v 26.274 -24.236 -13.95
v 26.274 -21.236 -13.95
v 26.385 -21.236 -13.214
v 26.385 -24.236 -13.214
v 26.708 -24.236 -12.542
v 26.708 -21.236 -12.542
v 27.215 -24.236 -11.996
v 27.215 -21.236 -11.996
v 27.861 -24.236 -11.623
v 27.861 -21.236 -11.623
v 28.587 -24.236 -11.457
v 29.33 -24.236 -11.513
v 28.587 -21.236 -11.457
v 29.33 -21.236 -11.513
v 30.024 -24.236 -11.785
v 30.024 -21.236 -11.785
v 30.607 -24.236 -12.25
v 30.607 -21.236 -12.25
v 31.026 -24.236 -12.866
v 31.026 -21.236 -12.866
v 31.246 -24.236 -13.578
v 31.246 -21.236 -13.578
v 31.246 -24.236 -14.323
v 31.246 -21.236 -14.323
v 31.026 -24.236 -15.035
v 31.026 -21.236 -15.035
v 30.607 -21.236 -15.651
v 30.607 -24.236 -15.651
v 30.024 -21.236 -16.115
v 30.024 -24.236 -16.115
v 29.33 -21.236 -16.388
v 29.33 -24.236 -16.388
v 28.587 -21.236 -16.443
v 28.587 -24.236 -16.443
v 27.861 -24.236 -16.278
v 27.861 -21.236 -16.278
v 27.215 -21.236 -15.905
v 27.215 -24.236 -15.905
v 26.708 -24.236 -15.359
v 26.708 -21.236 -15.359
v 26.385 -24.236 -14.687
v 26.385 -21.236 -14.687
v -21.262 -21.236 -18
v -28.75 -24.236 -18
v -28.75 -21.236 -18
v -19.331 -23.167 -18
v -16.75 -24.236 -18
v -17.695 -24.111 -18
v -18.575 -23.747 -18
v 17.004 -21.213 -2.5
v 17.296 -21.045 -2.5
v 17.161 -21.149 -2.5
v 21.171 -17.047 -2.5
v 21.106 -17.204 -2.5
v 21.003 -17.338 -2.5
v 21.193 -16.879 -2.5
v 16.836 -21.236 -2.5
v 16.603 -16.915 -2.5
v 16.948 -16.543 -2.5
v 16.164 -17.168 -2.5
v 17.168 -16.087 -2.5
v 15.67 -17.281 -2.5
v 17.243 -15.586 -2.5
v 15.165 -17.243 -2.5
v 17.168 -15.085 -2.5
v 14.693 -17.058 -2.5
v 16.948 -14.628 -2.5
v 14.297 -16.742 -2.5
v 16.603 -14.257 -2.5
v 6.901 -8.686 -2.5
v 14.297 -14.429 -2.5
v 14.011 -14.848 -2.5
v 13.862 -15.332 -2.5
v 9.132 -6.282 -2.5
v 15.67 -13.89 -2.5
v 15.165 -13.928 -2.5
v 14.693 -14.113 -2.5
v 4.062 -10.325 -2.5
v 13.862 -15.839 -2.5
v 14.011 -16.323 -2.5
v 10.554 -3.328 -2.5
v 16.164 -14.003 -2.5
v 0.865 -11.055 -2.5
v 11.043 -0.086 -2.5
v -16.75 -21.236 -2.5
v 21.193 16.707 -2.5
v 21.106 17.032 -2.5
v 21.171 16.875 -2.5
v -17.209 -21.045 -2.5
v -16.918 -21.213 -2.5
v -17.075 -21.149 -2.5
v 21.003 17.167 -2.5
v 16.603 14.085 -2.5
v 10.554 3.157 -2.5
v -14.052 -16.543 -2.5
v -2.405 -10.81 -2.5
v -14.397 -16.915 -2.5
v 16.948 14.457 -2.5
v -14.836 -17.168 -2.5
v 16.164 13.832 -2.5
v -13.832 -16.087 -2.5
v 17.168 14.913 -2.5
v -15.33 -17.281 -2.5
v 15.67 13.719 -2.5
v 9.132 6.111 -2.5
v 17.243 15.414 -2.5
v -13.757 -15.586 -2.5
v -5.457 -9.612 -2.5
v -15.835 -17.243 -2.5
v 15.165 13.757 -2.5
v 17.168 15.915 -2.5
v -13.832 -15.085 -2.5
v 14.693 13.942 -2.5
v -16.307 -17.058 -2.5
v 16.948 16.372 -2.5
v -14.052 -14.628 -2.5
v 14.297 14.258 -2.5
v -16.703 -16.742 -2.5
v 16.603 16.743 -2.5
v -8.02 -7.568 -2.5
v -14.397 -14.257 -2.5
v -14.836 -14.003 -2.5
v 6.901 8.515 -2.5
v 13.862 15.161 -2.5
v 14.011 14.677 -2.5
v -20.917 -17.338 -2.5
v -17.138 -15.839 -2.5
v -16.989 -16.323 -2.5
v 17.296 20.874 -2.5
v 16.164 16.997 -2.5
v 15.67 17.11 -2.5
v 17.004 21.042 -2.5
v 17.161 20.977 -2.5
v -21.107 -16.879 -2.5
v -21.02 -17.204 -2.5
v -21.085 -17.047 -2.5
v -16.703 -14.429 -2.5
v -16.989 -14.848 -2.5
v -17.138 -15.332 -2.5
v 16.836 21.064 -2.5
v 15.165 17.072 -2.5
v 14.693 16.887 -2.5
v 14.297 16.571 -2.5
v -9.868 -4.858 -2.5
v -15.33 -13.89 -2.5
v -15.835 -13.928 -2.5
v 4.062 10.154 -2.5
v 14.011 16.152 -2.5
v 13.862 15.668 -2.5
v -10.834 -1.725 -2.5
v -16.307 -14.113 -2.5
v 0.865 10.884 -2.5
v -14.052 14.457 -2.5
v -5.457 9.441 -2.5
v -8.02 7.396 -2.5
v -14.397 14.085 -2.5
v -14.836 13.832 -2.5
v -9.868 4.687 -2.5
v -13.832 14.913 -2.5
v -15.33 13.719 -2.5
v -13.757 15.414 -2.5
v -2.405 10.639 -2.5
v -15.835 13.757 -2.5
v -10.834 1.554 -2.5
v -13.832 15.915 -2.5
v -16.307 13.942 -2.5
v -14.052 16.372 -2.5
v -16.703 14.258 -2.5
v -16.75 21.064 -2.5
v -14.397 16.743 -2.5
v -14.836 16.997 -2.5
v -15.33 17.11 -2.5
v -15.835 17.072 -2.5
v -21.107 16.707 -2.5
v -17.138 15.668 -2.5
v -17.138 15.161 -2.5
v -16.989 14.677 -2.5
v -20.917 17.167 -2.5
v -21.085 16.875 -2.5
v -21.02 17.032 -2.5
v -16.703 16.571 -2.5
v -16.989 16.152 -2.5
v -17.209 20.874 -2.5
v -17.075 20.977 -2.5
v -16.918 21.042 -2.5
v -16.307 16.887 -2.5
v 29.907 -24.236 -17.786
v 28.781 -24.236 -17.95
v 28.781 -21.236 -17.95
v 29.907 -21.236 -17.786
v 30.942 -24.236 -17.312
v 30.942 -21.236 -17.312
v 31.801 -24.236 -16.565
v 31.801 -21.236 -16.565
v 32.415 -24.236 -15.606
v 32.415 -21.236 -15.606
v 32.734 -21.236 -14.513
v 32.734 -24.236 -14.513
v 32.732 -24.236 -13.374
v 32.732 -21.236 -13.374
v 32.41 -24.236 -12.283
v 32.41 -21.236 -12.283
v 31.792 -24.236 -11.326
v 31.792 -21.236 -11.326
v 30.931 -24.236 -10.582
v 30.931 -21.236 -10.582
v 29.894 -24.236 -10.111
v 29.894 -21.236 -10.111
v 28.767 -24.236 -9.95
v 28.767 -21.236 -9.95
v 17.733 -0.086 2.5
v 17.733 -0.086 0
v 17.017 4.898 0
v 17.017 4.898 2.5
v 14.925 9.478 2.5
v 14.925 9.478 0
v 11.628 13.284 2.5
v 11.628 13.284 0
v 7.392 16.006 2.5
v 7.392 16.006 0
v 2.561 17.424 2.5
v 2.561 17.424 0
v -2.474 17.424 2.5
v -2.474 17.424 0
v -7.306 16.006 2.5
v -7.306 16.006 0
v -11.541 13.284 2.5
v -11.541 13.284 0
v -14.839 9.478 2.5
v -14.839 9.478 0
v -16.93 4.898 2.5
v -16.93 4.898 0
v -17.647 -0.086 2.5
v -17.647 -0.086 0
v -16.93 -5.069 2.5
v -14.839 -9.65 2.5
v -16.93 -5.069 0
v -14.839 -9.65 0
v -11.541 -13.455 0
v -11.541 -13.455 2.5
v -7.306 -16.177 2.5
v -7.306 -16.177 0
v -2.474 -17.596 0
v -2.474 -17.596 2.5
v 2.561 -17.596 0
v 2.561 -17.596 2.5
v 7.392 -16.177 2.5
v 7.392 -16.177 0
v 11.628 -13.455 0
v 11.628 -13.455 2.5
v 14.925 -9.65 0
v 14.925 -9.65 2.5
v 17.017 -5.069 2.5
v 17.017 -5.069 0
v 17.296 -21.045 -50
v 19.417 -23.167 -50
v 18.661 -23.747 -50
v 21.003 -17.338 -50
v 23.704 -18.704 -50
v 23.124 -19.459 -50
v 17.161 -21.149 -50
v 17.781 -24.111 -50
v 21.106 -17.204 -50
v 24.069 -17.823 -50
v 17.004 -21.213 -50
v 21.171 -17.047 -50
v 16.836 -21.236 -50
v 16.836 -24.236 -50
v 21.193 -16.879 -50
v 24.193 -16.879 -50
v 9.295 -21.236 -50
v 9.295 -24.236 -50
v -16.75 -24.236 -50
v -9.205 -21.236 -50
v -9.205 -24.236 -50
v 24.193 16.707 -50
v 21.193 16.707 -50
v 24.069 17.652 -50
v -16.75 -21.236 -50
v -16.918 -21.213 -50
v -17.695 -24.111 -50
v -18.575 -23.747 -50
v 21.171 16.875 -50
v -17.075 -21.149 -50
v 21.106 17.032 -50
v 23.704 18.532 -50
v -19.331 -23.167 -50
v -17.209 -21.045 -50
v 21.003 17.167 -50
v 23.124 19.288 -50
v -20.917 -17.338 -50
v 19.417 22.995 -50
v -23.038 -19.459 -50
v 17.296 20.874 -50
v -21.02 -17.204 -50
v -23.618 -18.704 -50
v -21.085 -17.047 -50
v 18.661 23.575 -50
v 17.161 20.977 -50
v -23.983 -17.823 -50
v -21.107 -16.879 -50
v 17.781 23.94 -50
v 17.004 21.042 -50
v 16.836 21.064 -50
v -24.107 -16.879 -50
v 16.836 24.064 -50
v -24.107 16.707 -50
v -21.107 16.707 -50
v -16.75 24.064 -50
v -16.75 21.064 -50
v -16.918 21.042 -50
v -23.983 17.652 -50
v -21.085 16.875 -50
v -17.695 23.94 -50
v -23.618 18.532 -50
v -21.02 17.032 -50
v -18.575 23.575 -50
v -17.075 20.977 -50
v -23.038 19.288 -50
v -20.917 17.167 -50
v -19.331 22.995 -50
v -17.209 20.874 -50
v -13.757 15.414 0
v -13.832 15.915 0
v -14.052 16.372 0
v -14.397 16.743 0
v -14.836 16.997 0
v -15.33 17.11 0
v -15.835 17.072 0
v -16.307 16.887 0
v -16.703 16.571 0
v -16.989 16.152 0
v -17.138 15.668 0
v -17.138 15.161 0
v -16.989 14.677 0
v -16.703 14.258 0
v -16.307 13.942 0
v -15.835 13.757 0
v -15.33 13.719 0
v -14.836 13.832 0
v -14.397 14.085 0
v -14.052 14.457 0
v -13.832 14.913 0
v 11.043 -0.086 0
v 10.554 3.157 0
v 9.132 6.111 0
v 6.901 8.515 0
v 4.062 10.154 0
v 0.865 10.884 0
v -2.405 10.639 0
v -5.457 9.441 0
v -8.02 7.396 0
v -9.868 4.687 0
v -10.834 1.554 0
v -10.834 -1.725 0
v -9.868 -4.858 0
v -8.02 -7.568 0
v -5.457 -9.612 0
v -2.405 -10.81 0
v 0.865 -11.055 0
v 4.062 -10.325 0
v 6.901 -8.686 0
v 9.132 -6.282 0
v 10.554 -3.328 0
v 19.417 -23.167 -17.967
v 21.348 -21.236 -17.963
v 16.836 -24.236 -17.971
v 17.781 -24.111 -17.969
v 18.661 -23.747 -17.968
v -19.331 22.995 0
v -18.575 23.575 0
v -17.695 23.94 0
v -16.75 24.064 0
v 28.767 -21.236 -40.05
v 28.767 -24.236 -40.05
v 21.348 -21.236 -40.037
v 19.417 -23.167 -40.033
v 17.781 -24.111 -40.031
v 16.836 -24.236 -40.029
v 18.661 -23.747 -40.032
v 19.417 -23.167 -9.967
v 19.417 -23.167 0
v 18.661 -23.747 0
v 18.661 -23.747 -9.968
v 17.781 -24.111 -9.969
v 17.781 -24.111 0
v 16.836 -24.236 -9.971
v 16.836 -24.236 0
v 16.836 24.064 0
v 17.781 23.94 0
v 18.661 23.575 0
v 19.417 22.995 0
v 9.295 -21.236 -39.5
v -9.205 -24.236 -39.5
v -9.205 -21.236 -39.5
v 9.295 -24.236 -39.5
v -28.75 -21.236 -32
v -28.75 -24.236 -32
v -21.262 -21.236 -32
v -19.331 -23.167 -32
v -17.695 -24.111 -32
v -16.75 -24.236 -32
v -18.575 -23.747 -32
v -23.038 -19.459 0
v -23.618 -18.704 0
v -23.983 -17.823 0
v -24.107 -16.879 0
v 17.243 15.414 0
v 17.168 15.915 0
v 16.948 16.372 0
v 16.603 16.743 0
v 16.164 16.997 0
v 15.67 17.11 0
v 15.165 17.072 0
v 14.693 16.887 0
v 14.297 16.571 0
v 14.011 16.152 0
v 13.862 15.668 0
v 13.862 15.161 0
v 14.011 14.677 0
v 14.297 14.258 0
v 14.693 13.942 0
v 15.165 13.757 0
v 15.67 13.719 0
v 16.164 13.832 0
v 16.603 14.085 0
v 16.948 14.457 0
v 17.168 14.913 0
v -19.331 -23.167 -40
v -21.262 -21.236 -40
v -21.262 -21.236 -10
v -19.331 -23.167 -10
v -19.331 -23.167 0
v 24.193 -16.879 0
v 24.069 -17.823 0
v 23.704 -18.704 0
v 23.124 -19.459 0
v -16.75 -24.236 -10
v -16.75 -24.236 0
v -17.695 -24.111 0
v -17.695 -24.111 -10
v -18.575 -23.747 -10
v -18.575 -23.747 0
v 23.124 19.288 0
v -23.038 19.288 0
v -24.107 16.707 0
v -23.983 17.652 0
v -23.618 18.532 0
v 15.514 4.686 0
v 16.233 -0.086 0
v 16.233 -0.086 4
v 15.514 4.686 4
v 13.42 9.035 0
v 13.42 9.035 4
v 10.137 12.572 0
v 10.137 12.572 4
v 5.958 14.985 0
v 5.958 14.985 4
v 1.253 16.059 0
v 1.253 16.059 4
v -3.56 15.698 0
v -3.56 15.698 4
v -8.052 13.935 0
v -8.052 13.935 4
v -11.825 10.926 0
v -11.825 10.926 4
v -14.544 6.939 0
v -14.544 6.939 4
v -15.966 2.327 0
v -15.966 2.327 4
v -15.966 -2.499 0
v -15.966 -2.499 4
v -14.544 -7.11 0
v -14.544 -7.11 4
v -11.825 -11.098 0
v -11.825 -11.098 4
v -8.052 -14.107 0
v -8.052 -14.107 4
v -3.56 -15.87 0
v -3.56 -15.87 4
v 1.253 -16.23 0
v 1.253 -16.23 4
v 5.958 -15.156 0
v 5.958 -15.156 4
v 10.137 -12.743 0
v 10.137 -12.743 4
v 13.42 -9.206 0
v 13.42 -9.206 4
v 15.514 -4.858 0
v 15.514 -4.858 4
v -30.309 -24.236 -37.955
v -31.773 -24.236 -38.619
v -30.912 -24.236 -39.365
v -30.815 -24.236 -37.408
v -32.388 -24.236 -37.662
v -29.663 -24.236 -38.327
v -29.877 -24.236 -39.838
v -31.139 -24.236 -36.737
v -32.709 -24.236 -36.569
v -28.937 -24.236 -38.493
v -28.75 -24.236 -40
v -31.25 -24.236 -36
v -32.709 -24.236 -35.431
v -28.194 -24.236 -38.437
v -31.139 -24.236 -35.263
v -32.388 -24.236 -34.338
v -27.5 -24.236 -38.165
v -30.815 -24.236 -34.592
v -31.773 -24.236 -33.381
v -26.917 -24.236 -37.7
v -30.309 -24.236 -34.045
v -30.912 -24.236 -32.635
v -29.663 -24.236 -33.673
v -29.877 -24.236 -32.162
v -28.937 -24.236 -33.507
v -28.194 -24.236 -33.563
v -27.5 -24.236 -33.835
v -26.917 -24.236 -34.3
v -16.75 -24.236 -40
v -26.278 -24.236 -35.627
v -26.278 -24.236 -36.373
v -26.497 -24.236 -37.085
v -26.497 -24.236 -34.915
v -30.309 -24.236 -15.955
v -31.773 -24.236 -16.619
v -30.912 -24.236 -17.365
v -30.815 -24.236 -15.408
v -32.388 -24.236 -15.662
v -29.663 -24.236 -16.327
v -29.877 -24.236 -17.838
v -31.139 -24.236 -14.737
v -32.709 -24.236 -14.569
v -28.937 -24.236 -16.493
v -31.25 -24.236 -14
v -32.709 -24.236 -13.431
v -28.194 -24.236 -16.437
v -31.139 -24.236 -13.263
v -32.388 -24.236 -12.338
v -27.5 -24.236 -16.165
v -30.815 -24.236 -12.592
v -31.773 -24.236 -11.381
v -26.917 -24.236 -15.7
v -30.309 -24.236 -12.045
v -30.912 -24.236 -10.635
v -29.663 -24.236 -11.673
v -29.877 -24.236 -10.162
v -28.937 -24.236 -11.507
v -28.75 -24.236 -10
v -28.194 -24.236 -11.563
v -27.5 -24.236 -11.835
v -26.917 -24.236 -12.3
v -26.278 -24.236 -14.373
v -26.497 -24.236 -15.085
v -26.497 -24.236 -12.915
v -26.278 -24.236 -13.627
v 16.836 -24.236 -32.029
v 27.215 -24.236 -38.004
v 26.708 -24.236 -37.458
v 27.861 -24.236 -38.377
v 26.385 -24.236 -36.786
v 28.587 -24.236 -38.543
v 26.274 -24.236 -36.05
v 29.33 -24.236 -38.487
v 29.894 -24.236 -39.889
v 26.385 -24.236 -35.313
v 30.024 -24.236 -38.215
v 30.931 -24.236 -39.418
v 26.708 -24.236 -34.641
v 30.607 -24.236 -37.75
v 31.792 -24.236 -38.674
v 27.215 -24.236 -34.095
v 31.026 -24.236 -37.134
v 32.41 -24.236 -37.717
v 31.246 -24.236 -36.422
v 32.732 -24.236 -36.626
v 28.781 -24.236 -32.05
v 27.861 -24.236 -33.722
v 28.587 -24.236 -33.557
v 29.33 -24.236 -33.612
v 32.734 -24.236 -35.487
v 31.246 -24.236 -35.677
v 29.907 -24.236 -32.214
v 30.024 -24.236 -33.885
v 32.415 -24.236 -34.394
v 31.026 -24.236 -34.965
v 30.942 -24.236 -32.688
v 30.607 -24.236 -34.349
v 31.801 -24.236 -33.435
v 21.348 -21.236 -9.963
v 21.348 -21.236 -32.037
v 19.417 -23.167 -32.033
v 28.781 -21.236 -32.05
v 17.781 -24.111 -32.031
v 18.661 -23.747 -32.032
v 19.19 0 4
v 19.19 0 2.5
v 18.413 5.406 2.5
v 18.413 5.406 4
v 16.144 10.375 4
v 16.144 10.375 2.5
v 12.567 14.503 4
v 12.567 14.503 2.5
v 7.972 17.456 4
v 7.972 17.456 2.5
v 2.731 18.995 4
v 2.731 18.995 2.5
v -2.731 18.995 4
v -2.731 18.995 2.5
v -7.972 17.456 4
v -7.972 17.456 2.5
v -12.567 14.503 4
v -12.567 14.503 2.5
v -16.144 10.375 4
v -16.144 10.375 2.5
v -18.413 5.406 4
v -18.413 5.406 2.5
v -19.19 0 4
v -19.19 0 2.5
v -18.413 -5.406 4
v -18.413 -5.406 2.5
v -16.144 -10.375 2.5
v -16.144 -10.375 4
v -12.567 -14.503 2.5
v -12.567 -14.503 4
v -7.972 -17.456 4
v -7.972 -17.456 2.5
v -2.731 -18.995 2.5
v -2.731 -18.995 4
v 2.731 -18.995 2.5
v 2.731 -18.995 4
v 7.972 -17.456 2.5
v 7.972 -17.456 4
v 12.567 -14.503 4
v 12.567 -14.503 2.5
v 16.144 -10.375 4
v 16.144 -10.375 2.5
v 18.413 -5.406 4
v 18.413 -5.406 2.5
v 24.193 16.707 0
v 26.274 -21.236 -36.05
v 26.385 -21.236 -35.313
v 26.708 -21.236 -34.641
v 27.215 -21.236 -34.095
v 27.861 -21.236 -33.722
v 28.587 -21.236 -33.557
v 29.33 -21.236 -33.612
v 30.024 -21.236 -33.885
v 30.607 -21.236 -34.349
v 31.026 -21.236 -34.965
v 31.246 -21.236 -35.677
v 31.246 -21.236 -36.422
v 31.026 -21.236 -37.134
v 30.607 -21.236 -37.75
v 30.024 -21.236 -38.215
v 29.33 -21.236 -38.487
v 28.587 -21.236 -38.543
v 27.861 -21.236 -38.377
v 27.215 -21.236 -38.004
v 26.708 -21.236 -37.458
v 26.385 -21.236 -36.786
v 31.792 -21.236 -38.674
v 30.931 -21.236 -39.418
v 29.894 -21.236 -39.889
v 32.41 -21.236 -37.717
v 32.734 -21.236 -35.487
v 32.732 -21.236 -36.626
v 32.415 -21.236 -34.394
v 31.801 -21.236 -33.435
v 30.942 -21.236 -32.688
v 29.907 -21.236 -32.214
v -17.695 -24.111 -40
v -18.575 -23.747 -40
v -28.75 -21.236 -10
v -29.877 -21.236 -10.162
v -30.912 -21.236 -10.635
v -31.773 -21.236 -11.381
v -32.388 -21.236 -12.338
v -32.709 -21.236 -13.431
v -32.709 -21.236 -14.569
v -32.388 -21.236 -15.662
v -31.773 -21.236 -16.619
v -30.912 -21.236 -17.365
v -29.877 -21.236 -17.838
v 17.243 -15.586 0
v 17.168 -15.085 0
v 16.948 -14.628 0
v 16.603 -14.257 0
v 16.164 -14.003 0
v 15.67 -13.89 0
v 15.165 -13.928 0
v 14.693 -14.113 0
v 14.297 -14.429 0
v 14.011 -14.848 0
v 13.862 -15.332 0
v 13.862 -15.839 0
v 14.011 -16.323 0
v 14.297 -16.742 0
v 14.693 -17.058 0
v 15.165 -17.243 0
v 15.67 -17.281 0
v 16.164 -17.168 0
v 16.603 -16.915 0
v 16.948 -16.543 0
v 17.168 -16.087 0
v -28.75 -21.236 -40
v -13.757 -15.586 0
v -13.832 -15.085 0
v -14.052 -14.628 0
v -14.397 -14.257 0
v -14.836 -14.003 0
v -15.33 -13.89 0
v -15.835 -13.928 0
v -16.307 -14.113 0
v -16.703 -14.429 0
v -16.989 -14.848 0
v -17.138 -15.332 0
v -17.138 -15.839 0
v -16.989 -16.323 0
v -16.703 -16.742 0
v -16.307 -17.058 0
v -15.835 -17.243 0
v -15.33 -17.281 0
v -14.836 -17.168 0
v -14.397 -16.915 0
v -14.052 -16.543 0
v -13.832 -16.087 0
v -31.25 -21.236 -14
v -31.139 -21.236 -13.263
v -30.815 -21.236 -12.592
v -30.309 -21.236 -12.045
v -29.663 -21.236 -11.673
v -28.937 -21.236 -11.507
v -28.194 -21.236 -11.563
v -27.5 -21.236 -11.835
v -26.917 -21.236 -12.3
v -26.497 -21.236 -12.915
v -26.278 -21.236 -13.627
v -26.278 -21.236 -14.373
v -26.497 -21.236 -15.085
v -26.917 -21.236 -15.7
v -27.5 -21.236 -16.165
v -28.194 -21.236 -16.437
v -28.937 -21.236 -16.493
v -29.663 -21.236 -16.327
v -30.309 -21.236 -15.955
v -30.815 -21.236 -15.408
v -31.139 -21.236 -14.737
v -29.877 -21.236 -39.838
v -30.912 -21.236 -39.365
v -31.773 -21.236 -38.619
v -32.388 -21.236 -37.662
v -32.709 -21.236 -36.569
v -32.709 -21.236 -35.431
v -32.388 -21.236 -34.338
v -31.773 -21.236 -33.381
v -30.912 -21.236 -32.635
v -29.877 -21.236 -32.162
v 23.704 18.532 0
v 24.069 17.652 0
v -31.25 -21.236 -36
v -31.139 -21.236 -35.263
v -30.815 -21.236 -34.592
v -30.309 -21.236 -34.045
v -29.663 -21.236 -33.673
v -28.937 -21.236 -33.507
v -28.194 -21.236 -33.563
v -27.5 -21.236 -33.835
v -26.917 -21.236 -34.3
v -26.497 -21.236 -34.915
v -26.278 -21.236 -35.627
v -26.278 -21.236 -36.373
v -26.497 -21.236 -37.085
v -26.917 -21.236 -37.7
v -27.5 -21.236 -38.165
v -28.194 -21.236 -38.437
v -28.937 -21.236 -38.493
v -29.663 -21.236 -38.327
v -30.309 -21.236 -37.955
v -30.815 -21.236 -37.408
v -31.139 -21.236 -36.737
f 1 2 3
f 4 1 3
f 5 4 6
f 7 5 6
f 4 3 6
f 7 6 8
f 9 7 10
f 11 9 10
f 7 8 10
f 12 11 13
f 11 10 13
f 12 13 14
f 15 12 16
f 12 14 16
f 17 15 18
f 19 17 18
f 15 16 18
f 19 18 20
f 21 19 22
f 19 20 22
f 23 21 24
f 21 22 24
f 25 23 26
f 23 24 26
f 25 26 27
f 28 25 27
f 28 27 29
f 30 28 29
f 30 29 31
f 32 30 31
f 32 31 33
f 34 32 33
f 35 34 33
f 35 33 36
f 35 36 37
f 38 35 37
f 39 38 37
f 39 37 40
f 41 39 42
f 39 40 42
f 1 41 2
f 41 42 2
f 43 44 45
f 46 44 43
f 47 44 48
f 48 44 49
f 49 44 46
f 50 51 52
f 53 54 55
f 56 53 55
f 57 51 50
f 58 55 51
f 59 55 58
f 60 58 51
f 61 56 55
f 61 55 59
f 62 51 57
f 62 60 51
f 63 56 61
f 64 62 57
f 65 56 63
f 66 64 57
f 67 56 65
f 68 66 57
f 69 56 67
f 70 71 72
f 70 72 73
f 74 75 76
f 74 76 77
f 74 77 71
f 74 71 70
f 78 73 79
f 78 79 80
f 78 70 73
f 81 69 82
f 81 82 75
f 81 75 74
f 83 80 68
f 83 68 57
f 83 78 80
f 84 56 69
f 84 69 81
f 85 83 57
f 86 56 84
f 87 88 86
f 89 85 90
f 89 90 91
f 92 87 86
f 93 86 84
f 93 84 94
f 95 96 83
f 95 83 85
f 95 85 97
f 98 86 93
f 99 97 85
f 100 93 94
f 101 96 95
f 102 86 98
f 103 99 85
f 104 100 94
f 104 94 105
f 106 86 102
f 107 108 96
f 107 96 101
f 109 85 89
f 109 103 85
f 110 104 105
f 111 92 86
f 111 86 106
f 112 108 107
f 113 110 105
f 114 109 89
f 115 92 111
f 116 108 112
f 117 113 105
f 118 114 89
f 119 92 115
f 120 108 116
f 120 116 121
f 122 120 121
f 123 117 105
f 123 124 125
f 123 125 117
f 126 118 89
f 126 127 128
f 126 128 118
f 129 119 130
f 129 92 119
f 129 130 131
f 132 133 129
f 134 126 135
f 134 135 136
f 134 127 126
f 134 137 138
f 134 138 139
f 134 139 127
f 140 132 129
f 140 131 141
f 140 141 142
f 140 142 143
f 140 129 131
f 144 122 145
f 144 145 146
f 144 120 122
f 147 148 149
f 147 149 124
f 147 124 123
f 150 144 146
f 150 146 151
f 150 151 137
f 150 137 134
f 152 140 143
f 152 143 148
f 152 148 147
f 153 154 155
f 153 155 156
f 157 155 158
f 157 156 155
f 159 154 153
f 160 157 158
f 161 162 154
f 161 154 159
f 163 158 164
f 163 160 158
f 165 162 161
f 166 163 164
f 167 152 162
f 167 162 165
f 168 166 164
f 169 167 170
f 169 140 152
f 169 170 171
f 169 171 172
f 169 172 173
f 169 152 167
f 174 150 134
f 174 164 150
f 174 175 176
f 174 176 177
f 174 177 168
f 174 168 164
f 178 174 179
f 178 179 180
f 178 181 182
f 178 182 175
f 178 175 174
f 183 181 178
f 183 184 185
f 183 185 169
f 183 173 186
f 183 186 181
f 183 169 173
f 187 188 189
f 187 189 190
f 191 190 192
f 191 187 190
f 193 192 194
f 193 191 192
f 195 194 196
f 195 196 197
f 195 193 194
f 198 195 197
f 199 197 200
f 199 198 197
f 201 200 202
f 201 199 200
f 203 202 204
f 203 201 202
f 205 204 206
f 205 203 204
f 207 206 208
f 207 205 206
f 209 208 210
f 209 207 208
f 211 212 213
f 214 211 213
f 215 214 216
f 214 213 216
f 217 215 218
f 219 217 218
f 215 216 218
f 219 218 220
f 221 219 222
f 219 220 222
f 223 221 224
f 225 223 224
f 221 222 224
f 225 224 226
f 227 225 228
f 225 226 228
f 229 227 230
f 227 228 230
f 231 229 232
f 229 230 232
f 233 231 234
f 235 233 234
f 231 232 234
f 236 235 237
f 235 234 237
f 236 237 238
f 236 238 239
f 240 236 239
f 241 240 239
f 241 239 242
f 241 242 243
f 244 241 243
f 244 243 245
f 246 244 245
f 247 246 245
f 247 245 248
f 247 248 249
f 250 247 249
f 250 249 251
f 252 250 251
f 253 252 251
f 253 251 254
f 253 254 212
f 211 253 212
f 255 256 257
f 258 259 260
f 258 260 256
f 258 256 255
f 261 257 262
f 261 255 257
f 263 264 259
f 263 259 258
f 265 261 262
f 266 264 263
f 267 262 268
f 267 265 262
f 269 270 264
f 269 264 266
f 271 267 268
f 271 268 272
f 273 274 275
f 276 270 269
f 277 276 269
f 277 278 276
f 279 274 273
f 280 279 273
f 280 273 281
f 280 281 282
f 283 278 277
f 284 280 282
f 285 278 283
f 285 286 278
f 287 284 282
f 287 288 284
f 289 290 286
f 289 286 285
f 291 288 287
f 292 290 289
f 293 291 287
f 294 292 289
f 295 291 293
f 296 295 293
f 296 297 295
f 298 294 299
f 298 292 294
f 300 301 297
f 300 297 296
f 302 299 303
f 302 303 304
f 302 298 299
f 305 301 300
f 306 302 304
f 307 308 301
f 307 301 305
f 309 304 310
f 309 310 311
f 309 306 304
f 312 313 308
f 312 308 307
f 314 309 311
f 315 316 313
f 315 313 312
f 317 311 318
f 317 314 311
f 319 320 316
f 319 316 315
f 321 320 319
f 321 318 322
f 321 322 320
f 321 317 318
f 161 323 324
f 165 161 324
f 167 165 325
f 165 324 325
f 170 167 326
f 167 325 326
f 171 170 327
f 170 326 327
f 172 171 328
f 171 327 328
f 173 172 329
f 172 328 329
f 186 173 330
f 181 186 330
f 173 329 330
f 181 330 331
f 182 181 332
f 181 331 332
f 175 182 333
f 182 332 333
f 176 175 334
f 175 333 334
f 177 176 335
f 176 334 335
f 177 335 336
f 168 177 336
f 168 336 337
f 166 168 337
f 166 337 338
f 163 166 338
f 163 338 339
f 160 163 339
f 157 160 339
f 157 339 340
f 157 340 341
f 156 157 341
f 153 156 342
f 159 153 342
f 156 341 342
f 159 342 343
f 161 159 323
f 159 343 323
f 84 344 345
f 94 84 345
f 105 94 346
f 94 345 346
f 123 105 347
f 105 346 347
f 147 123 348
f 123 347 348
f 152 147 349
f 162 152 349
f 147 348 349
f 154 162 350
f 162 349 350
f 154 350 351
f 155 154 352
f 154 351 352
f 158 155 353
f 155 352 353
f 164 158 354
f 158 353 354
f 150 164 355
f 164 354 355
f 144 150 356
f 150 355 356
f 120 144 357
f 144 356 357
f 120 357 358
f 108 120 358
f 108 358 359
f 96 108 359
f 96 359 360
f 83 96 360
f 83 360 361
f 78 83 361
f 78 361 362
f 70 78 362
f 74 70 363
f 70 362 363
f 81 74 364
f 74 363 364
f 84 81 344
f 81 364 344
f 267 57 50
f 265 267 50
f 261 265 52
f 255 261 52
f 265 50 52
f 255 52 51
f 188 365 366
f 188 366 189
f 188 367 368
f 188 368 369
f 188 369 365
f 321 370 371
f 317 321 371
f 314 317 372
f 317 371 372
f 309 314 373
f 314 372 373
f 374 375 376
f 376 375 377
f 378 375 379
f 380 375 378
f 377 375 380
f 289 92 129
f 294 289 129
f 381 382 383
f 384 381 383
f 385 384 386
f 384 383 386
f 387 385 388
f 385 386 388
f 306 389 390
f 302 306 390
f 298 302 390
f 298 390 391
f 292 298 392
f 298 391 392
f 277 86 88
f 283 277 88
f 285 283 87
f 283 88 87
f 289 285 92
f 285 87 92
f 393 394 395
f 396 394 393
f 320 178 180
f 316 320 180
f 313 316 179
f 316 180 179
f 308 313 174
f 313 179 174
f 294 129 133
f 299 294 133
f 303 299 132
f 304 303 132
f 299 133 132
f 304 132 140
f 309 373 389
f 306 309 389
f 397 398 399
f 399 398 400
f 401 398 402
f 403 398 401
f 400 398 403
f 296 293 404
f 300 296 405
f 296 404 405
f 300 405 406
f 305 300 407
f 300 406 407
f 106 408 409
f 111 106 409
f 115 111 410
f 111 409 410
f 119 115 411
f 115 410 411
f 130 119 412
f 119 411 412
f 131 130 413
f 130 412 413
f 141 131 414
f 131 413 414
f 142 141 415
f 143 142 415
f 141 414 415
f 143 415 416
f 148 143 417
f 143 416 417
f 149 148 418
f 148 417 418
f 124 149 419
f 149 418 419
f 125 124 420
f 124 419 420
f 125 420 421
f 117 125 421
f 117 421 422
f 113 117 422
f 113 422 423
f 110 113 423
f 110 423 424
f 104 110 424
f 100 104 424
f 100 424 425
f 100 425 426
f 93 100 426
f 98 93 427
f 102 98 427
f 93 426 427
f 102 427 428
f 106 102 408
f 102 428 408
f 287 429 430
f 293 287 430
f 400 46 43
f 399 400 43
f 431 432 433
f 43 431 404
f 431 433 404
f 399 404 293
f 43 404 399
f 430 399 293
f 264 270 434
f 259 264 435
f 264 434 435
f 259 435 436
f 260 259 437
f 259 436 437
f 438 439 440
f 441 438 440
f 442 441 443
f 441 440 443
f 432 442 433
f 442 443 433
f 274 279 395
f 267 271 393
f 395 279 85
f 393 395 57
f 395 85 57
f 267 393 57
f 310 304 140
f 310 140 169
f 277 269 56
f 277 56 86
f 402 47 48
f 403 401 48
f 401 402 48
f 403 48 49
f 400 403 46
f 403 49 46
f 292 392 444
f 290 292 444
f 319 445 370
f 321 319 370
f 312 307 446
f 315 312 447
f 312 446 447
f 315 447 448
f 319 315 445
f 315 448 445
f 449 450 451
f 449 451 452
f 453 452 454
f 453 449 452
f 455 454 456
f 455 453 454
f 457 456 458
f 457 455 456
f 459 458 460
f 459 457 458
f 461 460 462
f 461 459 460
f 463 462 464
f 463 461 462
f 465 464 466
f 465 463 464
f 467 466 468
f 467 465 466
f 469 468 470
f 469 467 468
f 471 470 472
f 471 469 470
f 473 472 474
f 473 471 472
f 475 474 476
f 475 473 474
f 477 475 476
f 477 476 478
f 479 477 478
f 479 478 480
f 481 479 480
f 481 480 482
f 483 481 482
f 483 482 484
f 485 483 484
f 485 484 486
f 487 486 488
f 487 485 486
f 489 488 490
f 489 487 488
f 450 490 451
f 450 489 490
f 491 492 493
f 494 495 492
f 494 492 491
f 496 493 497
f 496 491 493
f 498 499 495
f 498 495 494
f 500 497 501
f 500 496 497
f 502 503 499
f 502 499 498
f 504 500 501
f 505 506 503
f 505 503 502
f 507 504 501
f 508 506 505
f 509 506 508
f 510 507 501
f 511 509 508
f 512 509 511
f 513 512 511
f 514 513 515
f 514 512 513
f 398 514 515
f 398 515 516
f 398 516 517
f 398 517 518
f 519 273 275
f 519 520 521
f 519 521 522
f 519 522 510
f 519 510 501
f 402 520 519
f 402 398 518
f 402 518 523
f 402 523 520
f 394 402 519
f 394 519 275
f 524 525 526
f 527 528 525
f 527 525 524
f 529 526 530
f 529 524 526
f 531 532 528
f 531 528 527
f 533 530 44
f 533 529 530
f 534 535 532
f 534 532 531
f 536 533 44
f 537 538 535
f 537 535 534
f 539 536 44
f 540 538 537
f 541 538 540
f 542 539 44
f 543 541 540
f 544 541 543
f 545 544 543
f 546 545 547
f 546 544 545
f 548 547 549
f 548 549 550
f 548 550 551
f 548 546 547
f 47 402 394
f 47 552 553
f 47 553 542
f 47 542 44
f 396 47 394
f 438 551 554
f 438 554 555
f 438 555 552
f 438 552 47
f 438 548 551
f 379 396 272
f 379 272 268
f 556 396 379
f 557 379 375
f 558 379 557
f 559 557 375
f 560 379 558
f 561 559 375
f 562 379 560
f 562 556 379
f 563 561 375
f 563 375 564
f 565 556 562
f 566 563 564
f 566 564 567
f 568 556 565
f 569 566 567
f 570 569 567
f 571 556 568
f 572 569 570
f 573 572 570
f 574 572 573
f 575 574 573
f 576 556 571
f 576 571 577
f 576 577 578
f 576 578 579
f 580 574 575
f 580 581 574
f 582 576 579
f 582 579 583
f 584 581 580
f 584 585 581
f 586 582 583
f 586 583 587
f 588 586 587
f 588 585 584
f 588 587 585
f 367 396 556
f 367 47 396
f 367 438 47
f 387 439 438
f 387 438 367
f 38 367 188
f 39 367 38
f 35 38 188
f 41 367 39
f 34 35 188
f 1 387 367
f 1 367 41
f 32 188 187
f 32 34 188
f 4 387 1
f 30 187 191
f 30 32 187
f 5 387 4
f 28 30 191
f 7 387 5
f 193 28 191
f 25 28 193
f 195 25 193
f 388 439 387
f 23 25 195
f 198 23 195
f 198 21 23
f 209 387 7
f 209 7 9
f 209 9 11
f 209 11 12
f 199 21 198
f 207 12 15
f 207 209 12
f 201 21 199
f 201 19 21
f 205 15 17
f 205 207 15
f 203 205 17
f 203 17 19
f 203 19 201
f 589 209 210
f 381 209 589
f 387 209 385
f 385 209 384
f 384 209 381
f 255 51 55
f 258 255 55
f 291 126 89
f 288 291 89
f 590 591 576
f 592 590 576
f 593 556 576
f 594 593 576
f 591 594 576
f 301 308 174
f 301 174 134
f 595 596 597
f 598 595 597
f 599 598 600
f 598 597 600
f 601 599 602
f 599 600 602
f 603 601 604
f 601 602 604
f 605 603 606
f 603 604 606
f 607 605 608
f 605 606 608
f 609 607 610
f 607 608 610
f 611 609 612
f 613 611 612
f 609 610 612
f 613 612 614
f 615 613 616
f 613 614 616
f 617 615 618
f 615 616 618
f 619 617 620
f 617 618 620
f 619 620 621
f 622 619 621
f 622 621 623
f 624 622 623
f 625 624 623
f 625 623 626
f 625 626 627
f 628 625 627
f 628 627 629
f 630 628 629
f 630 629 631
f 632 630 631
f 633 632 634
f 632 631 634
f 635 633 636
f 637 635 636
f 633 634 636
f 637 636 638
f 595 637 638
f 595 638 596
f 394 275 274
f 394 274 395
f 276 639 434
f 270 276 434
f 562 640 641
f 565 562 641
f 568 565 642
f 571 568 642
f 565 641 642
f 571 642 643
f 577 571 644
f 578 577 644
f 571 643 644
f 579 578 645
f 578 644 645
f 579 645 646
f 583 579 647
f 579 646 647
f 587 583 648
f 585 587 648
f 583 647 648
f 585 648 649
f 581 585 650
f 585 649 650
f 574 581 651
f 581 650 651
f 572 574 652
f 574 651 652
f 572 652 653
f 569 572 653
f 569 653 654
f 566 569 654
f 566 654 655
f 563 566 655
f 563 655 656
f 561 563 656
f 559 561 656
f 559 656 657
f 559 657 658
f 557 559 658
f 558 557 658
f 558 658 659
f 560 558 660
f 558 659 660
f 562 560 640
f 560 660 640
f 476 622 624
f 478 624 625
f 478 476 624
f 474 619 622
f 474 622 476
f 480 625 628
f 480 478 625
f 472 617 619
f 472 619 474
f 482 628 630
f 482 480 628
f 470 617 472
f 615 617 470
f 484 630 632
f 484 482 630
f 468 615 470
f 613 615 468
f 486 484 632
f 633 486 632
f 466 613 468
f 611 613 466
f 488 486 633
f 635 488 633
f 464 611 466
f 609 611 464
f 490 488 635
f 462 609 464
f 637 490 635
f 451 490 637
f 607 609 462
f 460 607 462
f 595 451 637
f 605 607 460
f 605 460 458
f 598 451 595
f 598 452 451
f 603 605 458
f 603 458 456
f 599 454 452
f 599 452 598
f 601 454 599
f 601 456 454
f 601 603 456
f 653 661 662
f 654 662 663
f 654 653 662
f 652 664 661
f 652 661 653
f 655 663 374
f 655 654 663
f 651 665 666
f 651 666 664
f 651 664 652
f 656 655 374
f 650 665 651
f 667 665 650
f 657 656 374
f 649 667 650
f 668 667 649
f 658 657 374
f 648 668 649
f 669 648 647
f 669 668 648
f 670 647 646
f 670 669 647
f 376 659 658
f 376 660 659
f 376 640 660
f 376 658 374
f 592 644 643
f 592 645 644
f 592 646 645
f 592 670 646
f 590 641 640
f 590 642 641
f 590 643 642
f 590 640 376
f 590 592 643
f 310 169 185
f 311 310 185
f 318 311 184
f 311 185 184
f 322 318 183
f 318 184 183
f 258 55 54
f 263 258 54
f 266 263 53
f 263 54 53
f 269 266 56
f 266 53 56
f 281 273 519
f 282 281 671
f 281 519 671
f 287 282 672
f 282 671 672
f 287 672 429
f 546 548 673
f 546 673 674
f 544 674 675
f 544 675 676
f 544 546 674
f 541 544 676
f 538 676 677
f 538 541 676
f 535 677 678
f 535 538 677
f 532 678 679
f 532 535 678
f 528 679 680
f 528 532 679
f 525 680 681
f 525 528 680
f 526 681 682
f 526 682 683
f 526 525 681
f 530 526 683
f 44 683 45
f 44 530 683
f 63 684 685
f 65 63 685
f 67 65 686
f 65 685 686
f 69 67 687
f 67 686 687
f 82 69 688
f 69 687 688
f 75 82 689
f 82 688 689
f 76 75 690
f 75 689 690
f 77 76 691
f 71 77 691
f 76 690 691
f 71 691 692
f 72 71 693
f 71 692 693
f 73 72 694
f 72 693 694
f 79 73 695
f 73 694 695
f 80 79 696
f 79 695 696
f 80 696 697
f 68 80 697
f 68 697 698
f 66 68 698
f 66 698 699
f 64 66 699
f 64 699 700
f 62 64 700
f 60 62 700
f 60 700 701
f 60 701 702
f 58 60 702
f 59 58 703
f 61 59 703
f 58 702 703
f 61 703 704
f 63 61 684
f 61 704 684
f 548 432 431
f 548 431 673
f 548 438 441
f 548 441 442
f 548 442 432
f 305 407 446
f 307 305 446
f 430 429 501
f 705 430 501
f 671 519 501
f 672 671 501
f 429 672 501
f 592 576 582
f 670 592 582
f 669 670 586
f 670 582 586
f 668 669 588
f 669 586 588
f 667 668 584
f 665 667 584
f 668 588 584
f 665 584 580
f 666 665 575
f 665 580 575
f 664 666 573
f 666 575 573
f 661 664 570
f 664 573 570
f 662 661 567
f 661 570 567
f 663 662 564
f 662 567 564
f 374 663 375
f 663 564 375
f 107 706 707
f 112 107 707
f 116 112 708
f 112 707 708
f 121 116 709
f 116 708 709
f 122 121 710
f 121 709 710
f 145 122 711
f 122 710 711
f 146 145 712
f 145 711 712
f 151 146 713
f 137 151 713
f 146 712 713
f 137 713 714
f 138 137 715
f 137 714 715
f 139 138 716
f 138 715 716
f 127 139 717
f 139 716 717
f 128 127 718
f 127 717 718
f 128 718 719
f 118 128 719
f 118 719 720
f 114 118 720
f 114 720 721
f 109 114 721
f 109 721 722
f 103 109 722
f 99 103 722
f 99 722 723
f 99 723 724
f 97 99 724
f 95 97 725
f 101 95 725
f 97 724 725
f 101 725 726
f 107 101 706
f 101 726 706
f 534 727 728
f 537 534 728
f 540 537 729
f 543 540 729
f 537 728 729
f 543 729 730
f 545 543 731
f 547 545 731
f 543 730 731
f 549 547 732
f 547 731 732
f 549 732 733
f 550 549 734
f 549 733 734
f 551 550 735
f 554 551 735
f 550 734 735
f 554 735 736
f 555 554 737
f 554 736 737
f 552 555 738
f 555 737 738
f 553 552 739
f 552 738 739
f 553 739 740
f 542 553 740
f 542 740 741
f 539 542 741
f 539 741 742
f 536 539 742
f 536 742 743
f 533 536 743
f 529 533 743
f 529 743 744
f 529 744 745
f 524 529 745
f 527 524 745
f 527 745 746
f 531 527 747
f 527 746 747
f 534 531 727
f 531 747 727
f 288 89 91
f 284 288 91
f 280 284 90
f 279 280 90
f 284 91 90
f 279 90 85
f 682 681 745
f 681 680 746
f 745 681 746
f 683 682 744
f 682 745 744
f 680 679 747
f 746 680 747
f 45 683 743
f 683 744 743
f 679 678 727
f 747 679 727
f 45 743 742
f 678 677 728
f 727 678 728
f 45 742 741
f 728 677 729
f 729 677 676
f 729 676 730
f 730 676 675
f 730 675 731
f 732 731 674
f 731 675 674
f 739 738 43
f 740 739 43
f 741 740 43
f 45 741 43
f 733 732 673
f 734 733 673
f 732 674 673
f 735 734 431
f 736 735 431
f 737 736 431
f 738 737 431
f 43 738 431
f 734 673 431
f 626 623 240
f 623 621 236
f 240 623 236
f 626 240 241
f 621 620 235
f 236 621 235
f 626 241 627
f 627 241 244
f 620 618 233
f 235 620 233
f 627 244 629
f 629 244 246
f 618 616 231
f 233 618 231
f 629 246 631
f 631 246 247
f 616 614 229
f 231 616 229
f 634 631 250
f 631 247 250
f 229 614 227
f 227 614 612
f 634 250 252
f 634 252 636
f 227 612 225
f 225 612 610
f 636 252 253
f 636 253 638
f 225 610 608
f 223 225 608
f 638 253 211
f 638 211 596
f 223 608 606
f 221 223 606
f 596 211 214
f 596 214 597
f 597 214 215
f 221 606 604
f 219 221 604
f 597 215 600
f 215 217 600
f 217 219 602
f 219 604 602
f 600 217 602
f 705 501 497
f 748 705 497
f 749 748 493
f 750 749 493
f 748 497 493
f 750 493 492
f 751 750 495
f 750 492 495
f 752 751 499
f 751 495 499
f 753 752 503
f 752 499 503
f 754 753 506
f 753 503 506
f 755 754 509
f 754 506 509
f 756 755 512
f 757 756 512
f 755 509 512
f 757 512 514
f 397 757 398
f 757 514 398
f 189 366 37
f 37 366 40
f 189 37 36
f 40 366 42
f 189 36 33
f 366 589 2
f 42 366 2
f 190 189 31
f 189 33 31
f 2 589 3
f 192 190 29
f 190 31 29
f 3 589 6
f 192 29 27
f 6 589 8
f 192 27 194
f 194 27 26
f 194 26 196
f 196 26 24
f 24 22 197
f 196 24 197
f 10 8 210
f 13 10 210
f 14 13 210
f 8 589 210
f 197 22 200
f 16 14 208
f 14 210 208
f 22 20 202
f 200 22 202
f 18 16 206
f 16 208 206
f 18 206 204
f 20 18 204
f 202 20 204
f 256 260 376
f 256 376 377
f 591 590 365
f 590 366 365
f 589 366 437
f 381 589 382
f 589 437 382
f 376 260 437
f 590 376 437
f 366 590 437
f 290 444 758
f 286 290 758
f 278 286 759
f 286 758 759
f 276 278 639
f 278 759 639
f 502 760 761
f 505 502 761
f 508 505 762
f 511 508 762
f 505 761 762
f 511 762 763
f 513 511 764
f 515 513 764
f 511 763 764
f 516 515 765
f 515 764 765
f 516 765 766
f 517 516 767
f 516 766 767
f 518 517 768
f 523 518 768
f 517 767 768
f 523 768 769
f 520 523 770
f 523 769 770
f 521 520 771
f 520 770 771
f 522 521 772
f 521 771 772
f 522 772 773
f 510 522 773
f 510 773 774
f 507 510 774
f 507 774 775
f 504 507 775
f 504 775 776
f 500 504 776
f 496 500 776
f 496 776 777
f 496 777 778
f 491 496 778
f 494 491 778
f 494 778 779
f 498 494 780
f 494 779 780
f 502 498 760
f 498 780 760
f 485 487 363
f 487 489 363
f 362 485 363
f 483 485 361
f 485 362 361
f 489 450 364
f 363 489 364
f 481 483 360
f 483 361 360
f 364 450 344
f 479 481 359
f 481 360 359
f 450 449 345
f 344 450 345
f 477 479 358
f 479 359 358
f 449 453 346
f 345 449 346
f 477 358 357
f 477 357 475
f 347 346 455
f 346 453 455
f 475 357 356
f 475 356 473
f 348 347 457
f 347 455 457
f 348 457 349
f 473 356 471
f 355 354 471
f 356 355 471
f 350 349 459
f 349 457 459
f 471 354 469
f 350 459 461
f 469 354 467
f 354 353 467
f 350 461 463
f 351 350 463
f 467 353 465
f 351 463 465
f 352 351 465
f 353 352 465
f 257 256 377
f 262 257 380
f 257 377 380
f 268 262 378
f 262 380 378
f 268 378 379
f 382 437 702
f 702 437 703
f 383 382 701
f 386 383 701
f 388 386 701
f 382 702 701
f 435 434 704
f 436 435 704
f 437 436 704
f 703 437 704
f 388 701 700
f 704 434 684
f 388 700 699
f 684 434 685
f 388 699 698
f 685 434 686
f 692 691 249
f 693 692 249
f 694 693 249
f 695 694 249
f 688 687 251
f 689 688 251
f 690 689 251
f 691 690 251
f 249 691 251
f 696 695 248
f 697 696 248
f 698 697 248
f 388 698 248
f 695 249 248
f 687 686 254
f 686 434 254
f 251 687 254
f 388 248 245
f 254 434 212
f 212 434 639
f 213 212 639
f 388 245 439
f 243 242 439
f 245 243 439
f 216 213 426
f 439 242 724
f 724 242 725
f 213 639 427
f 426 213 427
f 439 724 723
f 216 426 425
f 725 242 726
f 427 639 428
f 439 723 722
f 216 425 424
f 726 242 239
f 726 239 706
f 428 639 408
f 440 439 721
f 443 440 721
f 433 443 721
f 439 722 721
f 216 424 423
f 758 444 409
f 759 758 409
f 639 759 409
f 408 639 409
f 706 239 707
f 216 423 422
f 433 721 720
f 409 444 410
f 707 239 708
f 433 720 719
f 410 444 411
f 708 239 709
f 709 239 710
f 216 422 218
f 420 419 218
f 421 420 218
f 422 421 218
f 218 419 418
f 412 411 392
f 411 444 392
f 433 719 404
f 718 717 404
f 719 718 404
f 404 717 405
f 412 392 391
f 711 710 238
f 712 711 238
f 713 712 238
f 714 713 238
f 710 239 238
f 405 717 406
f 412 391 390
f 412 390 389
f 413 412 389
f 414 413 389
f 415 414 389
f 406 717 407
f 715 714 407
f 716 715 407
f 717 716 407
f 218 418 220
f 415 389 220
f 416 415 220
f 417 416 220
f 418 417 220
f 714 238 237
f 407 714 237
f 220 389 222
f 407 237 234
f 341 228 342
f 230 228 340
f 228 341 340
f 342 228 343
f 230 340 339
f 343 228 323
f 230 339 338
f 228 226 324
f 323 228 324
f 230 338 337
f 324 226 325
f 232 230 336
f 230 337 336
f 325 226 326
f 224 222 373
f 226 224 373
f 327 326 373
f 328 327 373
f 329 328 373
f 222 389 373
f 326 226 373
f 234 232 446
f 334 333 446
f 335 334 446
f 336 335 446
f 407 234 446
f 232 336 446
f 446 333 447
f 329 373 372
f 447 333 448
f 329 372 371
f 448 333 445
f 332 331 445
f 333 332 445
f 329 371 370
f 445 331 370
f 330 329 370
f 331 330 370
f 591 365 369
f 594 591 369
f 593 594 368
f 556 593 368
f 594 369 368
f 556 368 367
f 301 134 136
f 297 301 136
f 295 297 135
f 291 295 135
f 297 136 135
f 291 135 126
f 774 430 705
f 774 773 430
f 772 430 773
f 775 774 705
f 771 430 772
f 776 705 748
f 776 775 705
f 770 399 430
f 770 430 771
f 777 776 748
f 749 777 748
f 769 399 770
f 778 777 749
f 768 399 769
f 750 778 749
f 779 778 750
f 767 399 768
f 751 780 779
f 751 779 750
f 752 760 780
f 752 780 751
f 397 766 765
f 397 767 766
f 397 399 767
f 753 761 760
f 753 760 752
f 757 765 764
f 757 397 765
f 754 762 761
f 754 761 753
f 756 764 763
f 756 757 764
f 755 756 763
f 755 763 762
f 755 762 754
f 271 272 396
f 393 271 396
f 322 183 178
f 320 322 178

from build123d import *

# Parameters (mm, degrees)
SALIENTE_EXTRUIR3_DEPTH = 50
CROQUIS37_3_R           = 1.7
CROQUIS37_3_R_2         = 11
SALIENTE_EXTRUIR4_DEPTH = 2.5
CROQUIS38_R             = 17.69
CROQUIS38_R_2           = 16.19
SALIENTE_EXTRUIR5_DEPTH = 4
SALIENTE_EXTRUIR6_START = -1.5
CROQUIS40_R             = 19.19
CROQUIS40_R_2           = 17.69
SALIENTE_EXTRUIR6_DEPTH = 1.5
CROQUIS41_W             = 18.5
CROQUIS41_H             = 10.5
CORTAR_EXTRUIR1_DEPTH   = 11.5
SALIENTE_EXTRUIR7_DEPTH = 3
CROQUIS44_R             = 2.5
CORTAR_EXTRUIR2_DEPTH   = 3


with BuildPart() as part:
    # Croquis37 → Saliente-Extruir3 (new body)
    with BuildSketch(Plane.XY):
        with BuildLine():
            Line((-24.106917755, 16.707259035), (-24.106917755, -16.878527403))
            ThreePointArc((-24.106917755, -16.878527403), (-23.829078048, -18.275321931), (-23.037857506, -19.459467154))
            Line((-23.037857506, -19.459467154), (-19.330750725, -23.166573935))
            ThreePointArc((-19.330750725, -23.166573935), (-18.146605502, -23.957794478), (-16.749810974, -24.235634184))
            Line((-16.749810974, -24.235634184), (16.835975464, -24.235634184))
            ThreePointArc((16.835975464, -24.235634184), (18.232769992, -23.957794478), (19.416915215, -23.166573935))
            Line((19.416915215, -23.166573935), (23.124021997, -19.459467154))
            ThreePointArc((23.124021997, -19.459467154), (23.915242539, -18.275321931), (24.193082245, -16.878527403))
            Line((24.193082245, -16.878527403), (24.193082245, 16.707259035))
            ThreePointArc((24.193082245, 16.707259035), (23.915242539, 18.104053563), (23.124021997, 19.288198786))
            Line((23.124021997, 19.288198786), (19.416915215, 22.995305567))
            ThreePointArc((19.416915215, 22.995305567), (18.232769992, 23.78652611), (16.835975464, 24.064365816))
            Line((16.835975464, 24.064365816), (-16.749810974, 24.064365816))
            ThreePointArc((-16.749810974, 24.064365816), (-18.146605502, 23.78652611), (-19.330750725, 22.995305567))
            Line((-19.330750725, 22.995305567), (-23.037857506, 19.288198786))
            ThreePointArc((-23.037857506, 19.288198786), (-23.829078048, 18.104053563), (-24.106917755, 16.707259035))
        make_face()
        with BuildLine():
            ThreePointArc((17.295594872, -21.045253592), (17.084719695, -21.18615588), (16.835975464, -21.235634184))
            Line((16.835975464, -21.235634184), (-16.749810974, -21.235634184))
            ThreePointArc((-16.749810974, -21.235634184), (-16.998555205, -21.18615588), (-17.209430381, -21.045253592))
            Line((-17.209430381, -21.045253592), (-20.916537162, -17.338146811))
            ThreePointArc((-20.916537162, -17.338146811), (-21.057439451, -17.127271634), (-21.106917755, -16.878527403))
            Line((-21.106917755, -16.878527403), (-21.106917755, 16.707259035))
            ThreePointArc((-21.106917755, 16.707259035), (-21.057439451, 16.956003266), (-20.916537162, 17.166878443))
            Line((-20.916537162, 17.166878443), (-17.209430381, 20.873985224))
            ThreePointArc((-17.209430381, 20.873985224), (-16.998555205, 21.014887512), (-16.749810974, 21.064365816))
            Line((-16.749810974, 21.064365816), (16.835975464, 21.064365816))
            ThreePointArc((16.835975464, 21.064365816), (17.084719695, 21.014887512), (17.295594872, 20.873985224))
            Line((17.295594872, 20.873985224), (21.002701653, 17.166878443))
            ThreePointArc((21.002701653, 17.166878443), (21.143603941, 16.956003266), (21.193082245, 16.707259035))
            Line((21.193082245, 16.707259035), (21.193082245, -16.878527403))
            ThreePointArc((21.193082245, -16.878527403), (21.143603941, -17.127271634), (21.002701653, -17.338146811))
            Line((21.002701653, -17.338146811), (17.295594872, -21.045253592))
        make_face(mode=Mode.SUBTRACT)
    extrude(amount=-SALIENTE_EXTRUIR3_DEPTH)



with BuildPart() as body_2:
    # Croquis37<3> → Saliente-Extruir4 (new body)
    with BuildSketch(Plane.XY):
        with BuildLine():
            Line((-16.749810974, -21.235634184), (16.835975464, -21.235634184))
            ThreePointArc((16.835975464, -21.235634184), (17.084719695, -21.18615588), (17.295594872, -21.045253592))
            Line((17.295594872, -21.045253592), (21.002701653, -17.338146811))
            ThreePointArc((21.002701653, -17.338146811), (21.143603941, -17.127271634), (21.193082245, -16.878527403))
            Line((21.193082245, -16.878527403), (21.193082245, 16.707259035))
            ThreePointArc((21.193082245, 16.707259035), (21.143603941, 16.956003266), (21.002701653, 17.166878443))
            Line((21.002701653, 17.166878443), (17.295594872, 20.873985224))
            ThreePointArc((17.295594872, 20.873985224), (17.084719695, 21.014887512), (16.835975464, 21.064365816))
            Line((16.835975464, 21.064365816), (-16.749810974, 21.064365816))
            ThreePointArc((-16.749810974, 21.064365816), (-16.998555205, 21.014887512), (-17.209430381, 20.873985224))
            Line((-17.209430381, 20.873985224), (-20.916537162, 17.166878443))
            ThreePointArc((-20.916537162, 17.166878443), (-21.057439451, 16.956003266), (-21.106917755, 16.707259035))
            Line((-21.106917755, 16.707259035), (-21.106917755, -16.878527403))
            ThreePointArc((-21.106917755, -16.878527403), (-21.057439451, -17.127271634), (-20.916537162, -17.338146811))
            Line((-20.916537162, -17.338146811), (-17.209430381, -21.045253592))
            ThreePointArc((-17.209430381, -21.045253592), (-16.998555205, -21.18615588), (-16.749810974, -21.235634184))
        make_face()
        with Locations((-15.456917755, -15.585634184)):
            Circle(CROQUIS37_3_R, mode=Mode.SUBTRACT)
        with Locations((15.543082245, -15.585634184)):
            Circle(CROQUIS37_3_R, mode=Mode.SUBTRACT)
        with Locations((-15.456917755, 15.414365816)):
            Circle(CROQUIS37_3_R, mode=Mode.SUBTRACT)
        with Locations((0.043082245, -0.085634184)):
            Circle(CROQUIS37_3_R_2, mode=Mode.SUBTRACT)
        with Locations((15.543082245, 15.414365816)):
            Circle(CROQUIS37_3_R, mode=Mode.SUBTRACT)
    extrude(amount=-SALIENTE_EXTRUIR4_DEPTH)


with BuildPart() as part_1:
    add(part.part)

    add(body_2.part)  # Saliente-Extruir5 merges body 2
    # Croquis38 → Saliente-Extruir5 (add)
    with BuildSketch(Plane.XY):
        with Locations((0.043082245, -0.085634184)):
            Circle(CROQUIS38_R)
        with Locations((0.043082245, -0.085634184)):
            Circle(CROQUIS38_R_2, mode=Mode.SUBTRACT)
    extrude(amount=SALIENTE_EXTRUIR5_DEPTH)

    # Croquis40 → Saliente-Extruir6 (add)
    with BuildSketch(Plane.XY.offset(4).offset(SALIENTE_EXTRUIR6_START)):
        Circle(CROQUIS40_R)
        with Locations((0.043082245, -0.085634184)):
            Circle(CROQUIS40_R_2, mode=Mode.SUBTRACT)
    extrude(amount=SALIENTE_EXTRUIR6_DEPTH)

    # Croquis41 → Cortar-Extruir1 (cut)
    with BuildSketch(Plane.XZ.offset(24.235634184)):
        with Locations((0.045189026, -44.75)):
            Rectangle(CROQUIS41_W, CROQUIS41_H)
    extrude(amount=-CORTAR_EXTRUIR1_DEPTH, mode=Mode.SUBTRACT)

    # Croquis42 → Saliente-Extruir7 (add)
    with BuildSketch(Plane.XZ.offset(24.235634184)):
        with BuildLine():
            Line((-16.749810974, -10), (-28.749810974, -10))
            ThreePointArc((-28.749810974, -10), (-32.749810974, -14), (-28.749810974, -18))
            Line((-28.749810974, -18), (-16.749810974, -18))
            Line((-16.749810974, -18), (-16.749810974, -10))
        make_face()
        with BuildLine():
            Line((16.767018988, -9.971120394), (16.780805296, -17.971108515))
            Line((16.780805296, -17.971108515), (28.780787478, -17.950429053))
            ThreePointArc((28.780787478, -17.950429053), (32.773888384, -13.943541838), (28.767001169, -9.950440932))
            Line((28.767001169, -9.950440932), (16.767018988, -9.971120394))
        make_face()
        with BuildLine():
            Line((-16.749810974, -40), (-28.749810974, -40))
            ThreePointArc((-28.749810974, -40), (-32.749810974, -36), (-28.749810974, -32))
            Line((-28.749810974, -32), (-16.749810974, -32))
            Line((-16.749810974, -32), (-16.749810974, -40))
        make_face()
        with BuildLine():
            Line((16.767018988, -40.028879606), (16.780805296, -32.028891485))
            Line((16.780805296, -32.028891485), (28.780787478, -32.049570947))
            ThreePointArc((28.780787478, -32.049570947), (32.773888384, -36.056458162), (28.767001169, -40.049559068))
            Line((28.767001169, -40.049559068), (16.767018988, -40.028879606))
        make_face()
    extrude(amount=-SALIENTE_EXTRUIR7_DEPTH)

    # Croquis44 → Cortar-Extruir2 (cut)
    with BuildSketch(Plane(origin=(0, -21.235634184, 0), x_dir=(1, 0, 0), z_dir=(0, 1, 0))):
        with Locations((-28.749810974, 36)):
            Circle(CROQUIS44_R)
        with Locations((28.773894323, 36.049565008)):
            Circle(CROQUIS44_R)
        with Locations((28.773894323, 13.950434992)):
            Circle(CROQUIS44_R)
        with Locations((-28.749810974, 14)):
            Circle(CROQUIS44_R)
    extrude(amount=-CORTAR_EXTRUIR2_DEPTH, mode=Mode.SUBTRACT)


solid = part_1.part
